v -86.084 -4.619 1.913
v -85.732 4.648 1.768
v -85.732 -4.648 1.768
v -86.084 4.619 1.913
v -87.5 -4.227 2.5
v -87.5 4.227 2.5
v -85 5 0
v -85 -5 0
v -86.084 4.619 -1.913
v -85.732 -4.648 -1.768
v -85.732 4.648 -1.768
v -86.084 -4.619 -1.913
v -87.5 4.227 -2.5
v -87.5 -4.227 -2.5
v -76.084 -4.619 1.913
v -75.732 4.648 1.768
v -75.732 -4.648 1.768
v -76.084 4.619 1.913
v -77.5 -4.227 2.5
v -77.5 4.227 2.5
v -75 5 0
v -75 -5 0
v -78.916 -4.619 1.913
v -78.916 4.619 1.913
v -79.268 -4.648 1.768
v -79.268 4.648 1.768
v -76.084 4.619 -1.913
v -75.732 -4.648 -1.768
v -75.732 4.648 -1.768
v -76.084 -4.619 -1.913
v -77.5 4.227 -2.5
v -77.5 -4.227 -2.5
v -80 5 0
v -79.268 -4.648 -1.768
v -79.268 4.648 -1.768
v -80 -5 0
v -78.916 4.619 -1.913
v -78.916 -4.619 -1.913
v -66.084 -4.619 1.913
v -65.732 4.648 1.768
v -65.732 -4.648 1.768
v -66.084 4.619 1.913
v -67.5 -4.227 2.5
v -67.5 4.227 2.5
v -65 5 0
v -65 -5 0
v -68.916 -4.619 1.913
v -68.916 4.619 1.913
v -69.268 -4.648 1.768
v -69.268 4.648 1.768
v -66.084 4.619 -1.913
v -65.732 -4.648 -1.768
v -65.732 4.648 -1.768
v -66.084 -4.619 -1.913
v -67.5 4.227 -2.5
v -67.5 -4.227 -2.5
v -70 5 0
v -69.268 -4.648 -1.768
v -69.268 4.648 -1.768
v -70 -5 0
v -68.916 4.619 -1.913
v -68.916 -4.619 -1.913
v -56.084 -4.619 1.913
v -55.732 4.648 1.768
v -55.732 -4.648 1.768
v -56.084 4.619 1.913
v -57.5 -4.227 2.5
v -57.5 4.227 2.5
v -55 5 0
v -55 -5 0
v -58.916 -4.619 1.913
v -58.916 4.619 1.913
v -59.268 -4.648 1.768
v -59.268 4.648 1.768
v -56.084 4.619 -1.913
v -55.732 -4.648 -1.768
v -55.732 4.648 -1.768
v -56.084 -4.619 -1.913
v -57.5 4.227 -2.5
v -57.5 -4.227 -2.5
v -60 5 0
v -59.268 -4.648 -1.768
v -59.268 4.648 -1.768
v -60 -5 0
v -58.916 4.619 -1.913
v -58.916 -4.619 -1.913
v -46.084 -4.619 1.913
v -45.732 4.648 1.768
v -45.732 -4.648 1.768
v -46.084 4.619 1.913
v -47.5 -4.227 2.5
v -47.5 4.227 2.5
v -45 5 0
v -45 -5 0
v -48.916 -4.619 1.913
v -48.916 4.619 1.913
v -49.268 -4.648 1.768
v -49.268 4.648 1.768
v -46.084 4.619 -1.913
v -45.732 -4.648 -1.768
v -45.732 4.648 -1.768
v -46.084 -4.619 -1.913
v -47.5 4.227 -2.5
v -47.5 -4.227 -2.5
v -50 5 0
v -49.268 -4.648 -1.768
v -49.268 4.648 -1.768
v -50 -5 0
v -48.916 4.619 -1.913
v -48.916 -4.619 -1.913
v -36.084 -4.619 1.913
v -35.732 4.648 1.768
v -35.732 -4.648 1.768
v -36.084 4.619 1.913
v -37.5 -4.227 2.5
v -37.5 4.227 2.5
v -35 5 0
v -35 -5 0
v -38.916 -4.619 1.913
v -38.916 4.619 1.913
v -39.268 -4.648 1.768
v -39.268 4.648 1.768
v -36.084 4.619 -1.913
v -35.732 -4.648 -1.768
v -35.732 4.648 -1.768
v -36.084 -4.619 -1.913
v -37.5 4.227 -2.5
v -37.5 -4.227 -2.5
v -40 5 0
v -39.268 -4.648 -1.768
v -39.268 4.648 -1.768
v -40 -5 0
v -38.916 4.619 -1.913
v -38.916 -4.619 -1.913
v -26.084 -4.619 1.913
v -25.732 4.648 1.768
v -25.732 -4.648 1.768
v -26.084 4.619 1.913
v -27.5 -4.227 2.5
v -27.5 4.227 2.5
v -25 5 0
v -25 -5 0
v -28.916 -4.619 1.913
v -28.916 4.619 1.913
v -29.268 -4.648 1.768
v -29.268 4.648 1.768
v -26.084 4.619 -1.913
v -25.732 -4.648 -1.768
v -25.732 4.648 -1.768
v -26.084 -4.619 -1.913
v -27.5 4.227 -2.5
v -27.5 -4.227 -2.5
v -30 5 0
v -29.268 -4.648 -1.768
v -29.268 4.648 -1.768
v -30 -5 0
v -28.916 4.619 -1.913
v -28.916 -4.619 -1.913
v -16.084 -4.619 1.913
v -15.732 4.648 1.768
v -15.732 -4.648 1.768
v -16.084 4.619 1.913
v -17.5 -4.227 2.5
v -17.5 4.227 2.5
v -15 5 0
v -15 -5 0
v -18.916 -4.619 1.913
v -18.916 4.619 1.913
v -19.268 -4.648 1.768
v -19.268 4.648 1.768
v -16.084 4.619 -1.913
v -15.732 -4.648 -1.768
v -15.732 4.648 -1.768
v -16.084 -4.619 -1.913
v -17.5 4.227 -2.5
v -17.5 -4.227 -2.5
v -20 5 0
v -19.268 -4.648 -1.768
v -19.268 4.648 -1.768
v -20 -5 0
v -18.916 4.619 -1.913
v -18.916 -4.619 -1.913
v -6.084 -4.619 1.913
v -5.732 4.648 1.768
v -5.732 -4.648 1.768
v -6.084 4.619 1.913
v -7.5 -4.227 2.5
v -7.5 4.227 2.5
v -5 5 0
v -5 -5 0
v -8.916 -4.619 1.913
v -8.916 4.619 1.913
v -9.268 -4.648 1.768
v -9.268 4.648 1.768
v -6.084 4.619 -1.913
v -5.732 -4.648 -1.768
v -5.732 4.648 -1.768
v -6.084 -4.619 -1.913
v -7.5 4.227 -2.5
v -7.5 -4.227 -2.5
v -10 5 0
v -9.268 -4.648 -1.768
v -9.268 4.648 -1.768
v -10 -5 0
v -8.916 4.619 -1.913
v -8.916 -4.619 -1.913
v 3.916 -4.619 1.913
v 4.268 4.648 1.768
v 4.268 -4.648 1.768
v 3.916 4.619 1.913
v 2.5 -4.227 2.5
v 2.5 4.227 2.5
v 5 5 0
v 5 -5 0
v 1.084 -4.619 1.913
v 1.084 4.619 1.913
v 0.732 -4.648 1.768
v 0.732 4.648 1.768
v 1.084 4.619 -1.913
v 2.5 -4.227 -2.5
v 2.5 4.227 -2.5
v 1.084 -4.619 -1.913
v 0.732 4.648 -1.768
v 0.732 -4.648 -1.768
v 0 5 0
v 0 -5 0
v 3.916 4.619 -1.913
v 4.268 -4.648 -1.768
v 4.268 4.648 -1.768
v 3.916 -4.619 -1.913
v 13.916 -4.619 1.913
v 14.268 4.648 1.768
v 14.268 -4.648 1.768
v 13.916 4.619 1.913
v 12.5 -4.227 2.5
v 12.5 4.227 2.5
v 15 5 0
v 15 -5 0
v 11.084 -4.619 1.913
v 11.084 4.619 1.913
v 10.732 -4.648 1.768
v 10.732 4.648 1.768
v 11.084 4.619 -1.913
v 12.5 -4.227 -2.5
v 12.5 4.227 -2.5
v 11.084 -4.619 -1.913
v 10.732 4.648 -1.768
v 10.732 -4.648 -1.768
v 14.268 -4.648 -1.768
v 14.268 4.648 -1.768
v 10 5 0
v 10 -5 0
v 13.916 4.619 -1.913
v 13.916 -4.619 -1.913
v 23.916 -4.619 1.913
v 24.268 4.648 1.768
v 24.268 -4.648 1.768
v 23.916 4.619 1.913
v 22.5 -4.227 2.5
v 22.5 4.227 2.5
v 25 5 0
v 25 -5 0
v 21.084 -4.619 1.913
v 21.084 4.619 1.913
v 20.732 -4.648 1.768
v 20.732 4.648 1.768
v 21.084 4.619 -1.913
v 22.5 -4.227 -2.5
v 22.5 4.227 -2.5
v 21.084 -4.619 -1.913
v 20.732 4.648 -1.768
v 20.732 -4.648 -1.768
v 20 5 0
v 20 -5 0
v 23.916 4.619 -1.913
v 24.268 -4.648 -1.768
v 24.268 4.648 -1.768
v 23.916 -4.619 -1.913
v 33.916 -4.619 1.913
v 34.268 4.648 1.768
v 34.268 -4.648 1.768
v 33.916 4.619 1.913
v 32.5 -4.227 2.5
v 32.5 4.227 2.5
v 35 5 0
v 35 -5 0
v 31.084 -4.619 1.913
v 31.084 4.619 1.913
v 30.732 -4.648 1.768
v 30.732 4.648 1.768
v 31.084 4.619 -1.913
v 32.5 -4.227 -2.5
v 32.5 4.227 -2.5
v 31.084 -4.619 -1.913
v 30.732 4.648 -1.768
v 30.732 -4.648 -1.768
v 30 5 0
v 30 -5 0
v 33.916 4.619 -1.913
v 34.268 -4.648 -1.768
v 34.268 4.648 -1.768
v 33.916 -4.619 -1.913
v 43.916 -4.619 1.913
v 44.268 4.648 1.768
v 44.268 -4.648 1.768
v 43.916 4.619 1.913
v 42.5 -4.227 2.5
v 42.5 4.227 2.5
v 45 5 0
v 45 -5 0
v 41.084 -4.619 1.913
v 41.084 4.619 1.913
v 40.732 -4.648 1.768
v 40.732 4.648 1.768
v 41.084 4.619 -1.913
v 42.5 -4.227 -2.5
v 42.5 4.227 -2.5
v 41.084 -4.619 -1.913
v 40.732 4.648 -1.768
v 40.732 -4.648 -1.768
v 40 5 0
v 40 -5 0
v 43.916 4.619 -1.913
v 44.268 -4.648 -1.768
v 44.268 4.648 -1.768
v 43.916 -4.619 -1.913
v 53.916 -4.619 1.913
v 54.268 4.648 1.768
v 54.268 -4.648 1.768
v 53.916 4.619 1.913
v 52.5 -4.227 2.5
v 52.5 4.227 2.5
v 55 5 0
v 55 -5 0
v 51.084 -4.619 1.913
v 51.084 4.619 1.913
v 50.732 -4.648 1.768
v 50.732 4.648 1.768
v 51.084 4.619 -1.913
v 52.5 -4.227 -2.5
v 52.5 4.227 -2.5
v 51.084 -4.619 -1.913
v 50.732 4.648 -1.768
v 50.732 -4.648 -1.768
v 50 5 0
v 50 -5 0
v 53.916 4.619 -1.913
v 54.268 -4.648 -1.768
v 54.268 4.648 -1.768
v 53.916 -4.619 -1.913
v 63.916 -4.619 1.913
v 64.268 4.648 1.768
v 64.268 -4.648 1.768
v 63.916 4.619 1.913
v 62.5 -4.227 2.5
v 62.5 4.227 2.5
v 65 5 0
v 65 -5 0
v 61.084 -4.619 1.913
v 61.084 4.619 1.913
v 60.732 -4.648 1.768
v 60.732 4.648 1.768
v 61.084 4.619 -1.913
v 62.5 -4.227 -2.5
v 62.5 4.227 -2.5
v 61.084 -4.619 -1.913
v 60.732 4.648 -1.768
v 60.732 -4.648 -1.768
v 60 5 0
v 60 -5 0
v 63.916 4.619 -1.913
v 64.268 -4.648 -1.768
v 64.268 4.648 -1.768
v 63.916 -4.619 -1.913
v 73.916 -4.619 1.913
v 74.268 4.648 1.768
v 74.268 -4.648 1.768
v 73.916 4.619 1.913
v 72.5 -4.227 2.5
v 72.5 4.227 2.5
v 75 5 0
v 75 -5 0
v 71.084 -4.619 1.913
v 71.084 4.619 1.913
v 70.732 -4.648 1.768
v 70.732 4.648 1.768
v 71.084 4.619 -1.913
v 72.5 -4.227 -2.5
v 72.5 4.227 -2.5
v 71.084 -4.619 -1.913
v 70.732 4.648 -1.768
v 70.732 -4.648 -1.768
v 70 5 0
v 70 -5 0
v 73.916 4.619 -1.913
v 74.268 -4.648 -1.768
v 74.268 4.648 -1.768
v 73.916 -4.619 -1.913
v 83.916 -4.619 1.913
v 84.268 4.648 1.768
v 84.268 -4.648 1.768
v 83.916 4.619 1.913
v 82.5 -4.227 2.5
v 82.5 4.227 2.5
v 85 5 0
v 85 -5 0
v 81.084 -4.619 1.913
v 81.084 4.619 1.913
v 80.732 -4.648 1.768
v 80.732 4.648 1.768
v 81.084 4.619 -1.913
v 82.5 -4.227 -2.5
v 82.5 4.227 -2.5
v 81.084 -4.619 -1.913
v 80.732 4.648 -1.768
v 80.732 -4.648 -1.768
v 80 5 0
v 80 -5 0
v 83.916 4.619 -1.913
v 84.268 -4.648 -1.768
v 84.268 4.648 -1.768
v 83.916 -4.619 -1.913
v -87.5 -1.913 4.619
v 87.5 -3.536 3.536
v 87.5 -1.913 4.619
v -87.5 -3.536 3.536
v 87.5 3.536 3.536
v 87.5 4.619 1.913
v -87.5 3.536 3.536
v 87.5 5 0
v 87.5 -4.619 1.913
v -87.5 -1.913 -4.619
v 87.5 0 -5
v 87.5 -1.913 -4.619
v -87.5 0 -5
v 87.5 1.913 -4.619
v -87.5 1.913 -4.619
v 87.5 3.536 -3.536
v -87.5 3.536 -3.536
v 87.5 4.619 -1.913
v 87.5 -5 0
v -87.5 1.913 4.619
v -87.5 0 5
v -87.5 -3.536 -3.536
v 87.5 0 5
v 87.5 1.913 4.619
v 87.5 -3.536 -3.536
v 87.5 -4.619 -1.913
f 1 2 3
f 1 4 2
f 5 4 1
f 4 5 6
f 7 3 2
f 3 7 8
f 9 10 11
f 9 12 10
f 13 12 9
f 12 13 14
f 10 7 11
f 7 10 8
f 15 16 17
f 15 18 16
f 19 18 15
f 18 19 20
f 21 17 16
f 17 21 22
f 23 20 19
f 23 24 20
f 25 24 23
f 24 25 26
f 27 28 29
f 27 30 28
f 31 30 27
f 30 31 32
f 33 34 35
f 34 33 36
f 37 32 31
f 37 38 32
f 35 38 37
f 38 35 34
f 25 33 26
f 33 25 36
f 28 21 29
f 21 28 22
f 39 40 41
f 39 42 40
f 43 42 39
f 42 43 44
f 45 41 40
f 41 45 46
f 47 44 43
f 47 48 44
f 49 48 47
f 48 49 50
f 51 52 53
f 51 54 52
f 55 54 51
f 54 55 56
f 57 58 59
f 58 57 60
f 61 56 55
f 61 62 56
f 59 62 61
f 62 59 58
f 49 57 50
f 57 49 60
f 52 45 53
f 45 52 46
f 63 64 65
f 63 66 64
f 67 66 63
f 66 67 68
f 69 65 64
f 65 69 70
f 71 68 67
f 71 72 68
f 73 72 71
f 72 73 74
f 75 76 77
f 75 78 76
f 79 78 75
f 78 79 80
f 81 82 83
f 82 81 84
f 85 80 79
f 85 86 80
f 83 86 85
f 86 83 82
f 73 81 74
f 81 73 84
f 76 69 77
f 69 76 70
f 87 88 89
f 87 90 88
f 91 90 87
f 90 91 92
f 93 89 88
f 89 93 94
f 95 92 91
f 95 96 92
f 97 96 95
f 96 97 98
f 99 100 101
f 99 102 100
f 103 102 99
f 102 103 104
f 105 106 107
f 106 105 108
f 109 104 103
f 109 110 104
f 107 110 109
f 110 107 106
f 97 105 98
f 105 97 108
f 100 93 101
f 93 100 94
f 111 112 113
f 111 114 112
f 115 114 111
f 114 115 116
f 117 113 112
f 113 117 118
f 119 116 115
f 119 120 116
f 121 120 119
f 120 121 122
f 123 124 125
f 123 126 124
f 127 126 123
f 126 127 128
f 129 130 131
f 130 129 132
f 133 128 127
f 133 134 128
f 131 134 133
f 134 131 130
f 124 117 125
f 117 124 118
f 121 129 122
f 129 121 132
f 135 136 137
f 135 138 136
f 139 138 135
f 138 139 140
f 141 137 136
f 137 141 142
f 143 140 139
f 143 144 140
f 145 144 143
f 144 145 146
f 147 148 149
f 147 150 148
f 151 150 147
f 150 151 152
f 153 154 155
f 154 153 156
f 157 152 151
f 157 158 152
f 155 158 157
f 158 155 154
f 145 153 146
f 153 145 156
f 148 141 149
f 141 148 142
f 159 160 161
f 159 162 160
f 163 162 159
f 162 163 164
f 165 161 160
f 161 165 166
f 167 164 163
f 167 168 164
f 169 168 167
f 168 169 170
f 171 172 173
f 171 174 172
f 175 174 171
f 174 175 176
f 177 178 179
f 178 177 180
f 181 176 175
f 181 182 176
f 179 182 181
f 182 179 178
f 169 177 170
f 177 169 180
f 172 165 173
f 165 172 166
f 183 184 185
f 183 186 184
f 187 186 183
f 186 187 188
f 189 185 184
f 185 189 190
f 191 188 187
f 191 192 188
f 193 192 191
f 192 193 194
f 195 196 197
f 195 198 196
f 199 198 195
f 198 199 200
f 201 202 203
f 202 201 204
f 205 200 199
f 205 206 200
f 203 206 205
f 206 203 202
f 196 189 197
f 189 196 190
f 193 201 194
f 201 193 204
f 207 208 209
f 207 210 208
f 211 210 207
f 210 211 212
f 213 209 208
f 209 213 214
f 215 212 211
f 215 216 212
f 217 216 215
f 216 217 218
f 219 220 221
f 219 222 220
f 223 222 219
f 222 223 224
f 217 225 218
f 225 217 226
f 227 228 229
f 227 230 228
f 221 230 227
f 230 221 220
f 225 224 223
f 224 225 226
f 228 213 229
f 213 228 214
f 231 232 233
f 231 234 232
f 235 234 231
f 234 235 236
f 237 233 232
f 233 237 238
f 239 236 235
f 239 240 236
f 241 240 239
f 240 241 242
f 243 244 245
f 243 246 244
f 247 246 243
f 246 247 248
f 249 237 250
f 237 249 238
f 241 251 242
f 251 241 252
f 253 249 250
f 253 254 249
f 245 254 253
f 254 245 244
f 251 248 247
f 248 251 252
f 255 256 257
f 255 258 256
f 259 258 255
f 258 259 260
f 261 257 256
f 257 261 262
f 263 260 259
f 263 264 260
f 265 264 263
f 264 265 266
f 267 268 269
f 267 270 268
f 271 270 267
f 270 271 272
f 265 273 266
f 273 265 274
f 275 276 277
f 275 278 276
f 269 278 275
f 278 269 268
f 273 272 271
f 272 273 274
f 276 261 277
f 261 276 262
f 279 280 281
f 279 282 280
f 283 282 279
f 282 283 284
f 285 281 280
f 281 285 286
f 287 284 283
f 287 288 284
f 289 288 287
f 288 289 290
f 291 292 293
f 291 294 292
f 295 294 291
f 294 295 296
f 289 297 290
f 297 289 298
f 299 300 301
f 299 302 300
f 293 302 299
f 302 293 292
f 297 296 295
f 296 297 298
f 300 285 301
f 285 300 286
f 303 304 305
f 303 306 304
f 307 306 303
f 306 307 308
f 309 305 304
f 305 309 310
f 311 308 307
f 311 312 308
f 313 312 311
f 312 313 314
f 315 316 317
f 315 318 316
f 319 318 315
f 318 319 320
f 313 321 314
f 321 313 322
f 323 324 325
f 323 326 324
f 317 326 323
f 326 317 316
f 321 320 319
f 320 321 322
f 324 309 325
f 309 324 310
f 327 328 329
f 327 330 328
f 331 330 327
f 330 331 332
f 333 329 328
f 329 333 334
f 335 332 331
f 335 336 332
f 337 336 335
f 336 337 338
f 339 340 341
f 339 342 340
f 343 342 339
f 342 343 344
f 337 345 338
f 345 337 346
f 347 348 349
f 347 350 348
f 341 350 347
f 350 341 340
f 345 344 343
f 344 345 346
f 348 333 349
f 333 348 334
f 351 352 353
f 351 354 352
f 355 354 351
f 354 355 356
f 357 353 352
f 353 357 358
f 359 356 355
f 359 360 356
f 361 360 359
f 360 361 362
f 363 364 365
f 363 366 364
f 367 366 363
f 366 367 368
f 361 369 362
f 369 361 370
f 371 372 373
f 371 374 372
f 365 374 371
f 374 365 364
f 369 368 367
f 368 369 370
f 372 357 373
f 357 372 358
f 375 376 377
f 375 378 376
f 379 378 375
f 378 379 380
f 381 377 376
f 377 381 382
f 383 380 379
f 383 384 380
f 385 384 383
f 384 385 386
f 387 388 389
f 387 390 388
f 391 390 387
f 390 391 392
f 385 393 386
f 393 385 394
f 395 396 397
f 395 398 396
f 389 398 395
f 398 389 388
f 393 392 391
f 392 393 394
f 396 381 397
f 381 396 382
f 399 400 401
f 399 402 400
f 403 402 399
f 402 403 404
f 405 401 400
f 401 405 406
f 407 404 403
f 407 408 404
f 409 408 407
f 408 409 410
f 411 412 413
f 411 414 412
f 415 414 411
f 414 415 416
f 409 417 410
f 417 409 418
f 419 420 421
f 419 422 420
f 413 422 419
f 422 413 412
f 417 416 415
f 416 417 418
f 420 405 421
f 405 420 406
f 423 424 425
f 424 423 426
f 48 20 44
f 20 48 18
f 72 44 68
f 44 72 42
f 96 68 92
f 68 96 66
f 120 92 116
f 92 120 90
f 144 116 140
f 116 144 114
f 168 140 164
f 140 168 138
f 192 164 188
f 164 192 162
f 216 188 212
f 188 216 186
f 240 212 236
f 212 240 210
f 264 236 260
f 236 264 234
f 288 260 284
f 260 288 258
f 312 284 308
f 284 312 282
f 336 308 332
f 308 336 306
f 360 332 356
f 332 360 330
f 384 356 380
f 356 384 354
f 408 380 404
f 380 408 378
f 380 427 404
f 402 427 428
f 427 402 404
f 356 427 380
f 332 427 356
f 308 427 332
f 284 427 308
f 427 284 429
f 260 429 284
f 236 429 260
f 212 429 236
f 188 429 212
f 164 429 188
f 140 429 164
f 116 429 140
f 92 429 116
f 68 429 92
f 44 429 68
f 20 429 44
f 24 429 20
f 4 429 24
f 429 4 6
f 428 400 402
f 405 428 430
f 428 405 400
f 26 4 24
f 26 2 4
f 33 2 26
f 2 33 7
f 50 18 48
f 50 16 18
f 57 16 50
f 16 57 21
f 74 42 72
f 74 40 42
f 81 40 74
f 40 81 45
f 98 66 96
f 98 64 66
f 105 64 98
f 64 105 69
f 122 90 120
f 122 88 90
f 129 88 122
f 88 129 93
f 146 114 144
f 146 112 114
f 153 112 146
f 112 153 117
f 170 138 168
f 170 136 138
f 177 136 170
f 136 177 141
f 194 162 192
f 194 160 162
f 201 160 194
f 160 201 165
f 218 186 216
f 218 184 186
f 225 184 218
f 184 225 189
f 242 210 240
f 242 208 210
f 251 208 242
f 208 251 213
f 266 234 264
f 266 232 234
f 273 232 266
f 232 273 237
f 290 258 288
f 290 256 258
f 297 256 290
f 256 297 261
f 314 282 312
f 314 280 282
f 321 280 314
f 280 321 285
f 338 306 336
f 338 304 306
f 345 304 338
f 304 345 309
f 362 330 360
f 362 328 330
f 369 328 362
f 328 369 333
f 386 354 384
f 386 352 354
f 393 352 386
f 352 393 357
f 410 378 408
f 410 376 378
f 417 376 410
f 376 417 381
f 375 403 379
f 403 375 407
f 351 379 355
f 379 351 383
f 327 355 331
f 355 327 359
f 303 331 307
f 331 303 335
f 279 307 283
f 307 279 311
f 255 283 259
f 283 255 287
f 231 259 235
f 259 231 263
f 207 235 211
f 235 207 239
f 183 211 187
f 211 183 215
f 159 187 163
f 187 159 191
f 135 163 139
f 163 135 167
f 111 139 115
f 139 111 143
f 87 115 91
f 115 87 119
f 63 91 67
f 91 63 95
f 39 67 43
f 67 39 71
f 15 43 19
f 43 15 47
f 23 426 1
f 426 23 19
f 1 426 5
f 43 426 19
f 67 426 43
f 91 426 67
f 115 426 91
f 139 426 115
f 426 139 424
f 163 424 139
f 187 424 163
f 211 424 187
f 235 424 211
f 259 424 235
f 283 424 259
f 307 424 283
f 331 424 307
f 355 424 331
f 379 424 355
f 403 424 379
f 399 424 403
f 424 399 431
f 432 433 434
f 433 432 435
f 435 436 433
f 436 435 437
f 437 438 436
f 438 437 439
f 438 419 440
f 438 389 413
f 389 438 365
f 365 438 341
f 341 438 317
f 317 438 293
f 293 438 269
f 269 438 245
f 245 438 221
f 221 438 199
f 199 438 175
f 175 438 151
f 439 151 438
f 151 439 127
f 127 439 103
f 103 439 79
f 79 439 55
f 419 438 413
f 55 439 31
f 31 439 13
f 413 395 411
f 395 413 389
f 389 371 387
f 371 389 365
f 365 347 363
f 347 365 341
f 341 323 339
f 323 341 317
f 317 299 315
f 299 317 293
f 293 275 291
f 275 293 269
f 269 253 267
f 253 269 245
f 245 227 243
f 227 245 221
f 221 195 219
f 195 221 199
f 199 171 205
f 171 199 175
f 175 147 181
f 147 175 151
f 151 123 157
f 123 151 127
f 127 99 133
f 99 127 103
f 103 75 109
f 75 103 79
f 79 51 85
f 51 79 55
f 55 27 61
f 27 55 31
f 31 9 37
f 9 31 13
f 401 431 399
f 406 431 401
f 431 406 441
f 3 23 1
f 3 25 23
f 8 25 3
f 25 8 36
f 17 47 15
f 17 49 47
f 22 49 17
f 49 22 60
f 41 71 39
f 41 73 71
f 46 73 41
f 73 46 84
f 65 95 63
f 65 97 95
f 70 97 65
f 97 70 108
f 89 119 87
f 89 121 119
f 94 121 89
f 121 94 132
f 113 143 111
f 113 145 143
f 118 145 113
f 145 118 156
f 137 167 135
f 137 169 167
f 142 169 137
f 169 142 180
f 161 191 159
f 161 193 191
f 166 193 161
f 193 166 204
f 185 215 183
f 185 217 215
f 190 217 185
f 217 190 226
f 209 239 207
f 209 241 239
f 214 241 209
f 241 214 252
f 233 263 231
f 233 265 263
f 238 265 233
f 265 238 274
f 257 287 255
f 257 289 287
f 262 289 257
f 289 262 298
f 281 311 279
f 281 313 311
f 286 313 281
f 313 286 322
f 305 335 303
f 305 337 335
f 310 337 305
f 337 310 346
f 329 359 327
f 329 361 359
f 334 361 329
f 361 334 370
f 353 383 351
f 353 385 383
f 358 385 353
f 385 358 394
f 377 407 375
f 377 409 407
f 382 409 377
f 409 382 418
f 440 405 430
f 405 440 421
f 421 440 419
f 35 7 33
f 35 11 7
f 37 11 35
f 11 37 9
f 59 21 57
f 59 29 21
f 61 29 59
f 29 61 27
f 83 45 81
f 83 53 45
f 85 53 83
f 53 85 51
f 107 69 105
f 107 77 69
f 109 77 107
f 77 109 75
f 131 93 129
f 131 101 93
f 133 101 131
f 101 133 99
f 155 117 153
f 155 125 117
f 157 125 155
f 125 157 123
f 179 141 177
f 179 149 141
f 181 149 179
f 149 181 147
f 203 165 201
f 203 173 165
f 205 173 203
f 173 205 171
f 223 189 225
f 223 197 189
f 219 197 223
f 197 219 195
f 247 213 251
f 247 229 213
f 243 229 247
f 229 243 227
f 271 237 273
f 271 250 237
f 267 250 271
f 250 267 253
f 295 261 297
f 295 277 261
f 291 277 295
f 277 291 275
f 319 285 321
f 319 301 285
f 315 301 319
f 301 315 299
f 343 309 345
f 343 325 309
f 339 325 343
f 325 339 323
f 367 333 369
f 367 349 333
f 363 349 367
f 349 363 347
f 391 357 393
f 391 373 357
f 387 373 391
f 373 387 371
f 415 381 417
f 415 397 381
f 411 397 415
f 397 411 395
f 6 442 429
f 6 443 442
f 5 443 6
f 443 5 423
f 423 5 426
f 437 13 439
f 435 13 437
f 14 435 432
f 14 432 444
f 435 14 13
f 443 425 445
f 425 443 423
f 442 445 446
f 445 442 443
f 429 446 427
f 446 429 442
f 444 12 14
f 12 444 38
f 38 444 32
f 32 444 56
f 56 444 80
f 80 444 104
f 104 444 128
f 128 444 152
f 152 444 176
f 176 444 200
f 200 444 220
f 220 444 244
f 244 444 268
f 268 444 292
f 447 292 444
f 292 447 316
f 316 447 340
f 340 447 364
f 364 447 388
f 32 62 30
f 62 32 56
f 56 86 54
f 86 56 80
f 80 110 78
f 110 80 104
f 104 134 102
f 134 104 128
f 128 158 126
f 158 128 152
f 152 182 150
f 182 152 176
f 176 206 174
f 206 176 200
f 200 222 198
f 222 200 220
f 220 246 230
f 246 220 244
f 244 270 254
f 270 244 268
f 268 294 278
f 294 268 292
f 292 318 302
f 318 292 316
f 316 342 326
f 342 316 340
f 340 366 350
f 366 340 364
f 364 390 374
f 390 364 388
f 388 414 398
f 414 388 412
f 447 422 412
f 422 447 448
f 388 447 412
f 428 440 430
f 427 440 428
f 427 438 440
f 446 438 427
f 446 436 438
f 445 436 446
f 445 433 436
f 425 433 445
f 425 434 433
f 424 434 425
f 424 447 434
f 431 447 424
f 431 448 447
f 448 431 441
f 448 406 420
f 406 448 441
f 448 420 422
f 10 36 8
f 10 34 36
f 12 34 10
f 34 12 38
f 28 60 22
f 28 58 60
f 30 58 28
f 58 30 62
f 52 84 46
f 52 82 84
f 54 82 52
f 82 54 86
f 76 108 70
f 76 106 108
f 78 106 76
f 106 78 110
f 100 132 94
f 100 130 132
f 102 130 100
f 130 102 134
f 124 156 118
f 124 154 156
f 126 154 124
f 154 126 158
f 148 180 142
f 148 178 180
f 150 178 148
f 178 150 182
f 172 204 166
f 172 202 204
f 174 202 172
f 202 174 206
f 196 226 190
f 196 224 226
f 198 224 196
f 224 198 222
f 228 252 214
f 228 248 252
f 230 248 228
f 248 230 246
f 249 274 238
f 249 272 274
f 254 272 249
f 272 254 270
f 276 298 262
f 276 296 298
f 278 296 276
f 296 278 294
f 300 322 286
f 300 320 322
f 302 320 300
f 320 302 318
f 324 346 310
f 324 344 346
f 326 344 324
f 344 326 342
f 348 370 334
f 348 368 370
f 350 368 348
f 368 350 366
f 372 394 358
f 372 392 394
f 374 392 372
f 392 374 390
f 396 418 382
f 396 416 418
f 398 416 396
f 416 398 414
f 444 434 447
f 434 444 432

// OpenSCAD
module AS200(length = 175, radius = 5)
{
    difference()
    {
        translate([0,0,0])
        {
            rotate([90,0,90])
            {
                cylinder(h = length, r1 = radius, r2 = radius, center = true);
            }
        }
        
        for (i = [-length-radius/2:10:length/2-radius/2])
        {
            translate([i,0,0])
            {
                rotate([90,0,0])
                {
                    cylinder(h = length, r1 = radius*2/4, r2 = radius*2/4, center = true);
                }
            }
        }
    }
}


/* Testing */

AS200();
